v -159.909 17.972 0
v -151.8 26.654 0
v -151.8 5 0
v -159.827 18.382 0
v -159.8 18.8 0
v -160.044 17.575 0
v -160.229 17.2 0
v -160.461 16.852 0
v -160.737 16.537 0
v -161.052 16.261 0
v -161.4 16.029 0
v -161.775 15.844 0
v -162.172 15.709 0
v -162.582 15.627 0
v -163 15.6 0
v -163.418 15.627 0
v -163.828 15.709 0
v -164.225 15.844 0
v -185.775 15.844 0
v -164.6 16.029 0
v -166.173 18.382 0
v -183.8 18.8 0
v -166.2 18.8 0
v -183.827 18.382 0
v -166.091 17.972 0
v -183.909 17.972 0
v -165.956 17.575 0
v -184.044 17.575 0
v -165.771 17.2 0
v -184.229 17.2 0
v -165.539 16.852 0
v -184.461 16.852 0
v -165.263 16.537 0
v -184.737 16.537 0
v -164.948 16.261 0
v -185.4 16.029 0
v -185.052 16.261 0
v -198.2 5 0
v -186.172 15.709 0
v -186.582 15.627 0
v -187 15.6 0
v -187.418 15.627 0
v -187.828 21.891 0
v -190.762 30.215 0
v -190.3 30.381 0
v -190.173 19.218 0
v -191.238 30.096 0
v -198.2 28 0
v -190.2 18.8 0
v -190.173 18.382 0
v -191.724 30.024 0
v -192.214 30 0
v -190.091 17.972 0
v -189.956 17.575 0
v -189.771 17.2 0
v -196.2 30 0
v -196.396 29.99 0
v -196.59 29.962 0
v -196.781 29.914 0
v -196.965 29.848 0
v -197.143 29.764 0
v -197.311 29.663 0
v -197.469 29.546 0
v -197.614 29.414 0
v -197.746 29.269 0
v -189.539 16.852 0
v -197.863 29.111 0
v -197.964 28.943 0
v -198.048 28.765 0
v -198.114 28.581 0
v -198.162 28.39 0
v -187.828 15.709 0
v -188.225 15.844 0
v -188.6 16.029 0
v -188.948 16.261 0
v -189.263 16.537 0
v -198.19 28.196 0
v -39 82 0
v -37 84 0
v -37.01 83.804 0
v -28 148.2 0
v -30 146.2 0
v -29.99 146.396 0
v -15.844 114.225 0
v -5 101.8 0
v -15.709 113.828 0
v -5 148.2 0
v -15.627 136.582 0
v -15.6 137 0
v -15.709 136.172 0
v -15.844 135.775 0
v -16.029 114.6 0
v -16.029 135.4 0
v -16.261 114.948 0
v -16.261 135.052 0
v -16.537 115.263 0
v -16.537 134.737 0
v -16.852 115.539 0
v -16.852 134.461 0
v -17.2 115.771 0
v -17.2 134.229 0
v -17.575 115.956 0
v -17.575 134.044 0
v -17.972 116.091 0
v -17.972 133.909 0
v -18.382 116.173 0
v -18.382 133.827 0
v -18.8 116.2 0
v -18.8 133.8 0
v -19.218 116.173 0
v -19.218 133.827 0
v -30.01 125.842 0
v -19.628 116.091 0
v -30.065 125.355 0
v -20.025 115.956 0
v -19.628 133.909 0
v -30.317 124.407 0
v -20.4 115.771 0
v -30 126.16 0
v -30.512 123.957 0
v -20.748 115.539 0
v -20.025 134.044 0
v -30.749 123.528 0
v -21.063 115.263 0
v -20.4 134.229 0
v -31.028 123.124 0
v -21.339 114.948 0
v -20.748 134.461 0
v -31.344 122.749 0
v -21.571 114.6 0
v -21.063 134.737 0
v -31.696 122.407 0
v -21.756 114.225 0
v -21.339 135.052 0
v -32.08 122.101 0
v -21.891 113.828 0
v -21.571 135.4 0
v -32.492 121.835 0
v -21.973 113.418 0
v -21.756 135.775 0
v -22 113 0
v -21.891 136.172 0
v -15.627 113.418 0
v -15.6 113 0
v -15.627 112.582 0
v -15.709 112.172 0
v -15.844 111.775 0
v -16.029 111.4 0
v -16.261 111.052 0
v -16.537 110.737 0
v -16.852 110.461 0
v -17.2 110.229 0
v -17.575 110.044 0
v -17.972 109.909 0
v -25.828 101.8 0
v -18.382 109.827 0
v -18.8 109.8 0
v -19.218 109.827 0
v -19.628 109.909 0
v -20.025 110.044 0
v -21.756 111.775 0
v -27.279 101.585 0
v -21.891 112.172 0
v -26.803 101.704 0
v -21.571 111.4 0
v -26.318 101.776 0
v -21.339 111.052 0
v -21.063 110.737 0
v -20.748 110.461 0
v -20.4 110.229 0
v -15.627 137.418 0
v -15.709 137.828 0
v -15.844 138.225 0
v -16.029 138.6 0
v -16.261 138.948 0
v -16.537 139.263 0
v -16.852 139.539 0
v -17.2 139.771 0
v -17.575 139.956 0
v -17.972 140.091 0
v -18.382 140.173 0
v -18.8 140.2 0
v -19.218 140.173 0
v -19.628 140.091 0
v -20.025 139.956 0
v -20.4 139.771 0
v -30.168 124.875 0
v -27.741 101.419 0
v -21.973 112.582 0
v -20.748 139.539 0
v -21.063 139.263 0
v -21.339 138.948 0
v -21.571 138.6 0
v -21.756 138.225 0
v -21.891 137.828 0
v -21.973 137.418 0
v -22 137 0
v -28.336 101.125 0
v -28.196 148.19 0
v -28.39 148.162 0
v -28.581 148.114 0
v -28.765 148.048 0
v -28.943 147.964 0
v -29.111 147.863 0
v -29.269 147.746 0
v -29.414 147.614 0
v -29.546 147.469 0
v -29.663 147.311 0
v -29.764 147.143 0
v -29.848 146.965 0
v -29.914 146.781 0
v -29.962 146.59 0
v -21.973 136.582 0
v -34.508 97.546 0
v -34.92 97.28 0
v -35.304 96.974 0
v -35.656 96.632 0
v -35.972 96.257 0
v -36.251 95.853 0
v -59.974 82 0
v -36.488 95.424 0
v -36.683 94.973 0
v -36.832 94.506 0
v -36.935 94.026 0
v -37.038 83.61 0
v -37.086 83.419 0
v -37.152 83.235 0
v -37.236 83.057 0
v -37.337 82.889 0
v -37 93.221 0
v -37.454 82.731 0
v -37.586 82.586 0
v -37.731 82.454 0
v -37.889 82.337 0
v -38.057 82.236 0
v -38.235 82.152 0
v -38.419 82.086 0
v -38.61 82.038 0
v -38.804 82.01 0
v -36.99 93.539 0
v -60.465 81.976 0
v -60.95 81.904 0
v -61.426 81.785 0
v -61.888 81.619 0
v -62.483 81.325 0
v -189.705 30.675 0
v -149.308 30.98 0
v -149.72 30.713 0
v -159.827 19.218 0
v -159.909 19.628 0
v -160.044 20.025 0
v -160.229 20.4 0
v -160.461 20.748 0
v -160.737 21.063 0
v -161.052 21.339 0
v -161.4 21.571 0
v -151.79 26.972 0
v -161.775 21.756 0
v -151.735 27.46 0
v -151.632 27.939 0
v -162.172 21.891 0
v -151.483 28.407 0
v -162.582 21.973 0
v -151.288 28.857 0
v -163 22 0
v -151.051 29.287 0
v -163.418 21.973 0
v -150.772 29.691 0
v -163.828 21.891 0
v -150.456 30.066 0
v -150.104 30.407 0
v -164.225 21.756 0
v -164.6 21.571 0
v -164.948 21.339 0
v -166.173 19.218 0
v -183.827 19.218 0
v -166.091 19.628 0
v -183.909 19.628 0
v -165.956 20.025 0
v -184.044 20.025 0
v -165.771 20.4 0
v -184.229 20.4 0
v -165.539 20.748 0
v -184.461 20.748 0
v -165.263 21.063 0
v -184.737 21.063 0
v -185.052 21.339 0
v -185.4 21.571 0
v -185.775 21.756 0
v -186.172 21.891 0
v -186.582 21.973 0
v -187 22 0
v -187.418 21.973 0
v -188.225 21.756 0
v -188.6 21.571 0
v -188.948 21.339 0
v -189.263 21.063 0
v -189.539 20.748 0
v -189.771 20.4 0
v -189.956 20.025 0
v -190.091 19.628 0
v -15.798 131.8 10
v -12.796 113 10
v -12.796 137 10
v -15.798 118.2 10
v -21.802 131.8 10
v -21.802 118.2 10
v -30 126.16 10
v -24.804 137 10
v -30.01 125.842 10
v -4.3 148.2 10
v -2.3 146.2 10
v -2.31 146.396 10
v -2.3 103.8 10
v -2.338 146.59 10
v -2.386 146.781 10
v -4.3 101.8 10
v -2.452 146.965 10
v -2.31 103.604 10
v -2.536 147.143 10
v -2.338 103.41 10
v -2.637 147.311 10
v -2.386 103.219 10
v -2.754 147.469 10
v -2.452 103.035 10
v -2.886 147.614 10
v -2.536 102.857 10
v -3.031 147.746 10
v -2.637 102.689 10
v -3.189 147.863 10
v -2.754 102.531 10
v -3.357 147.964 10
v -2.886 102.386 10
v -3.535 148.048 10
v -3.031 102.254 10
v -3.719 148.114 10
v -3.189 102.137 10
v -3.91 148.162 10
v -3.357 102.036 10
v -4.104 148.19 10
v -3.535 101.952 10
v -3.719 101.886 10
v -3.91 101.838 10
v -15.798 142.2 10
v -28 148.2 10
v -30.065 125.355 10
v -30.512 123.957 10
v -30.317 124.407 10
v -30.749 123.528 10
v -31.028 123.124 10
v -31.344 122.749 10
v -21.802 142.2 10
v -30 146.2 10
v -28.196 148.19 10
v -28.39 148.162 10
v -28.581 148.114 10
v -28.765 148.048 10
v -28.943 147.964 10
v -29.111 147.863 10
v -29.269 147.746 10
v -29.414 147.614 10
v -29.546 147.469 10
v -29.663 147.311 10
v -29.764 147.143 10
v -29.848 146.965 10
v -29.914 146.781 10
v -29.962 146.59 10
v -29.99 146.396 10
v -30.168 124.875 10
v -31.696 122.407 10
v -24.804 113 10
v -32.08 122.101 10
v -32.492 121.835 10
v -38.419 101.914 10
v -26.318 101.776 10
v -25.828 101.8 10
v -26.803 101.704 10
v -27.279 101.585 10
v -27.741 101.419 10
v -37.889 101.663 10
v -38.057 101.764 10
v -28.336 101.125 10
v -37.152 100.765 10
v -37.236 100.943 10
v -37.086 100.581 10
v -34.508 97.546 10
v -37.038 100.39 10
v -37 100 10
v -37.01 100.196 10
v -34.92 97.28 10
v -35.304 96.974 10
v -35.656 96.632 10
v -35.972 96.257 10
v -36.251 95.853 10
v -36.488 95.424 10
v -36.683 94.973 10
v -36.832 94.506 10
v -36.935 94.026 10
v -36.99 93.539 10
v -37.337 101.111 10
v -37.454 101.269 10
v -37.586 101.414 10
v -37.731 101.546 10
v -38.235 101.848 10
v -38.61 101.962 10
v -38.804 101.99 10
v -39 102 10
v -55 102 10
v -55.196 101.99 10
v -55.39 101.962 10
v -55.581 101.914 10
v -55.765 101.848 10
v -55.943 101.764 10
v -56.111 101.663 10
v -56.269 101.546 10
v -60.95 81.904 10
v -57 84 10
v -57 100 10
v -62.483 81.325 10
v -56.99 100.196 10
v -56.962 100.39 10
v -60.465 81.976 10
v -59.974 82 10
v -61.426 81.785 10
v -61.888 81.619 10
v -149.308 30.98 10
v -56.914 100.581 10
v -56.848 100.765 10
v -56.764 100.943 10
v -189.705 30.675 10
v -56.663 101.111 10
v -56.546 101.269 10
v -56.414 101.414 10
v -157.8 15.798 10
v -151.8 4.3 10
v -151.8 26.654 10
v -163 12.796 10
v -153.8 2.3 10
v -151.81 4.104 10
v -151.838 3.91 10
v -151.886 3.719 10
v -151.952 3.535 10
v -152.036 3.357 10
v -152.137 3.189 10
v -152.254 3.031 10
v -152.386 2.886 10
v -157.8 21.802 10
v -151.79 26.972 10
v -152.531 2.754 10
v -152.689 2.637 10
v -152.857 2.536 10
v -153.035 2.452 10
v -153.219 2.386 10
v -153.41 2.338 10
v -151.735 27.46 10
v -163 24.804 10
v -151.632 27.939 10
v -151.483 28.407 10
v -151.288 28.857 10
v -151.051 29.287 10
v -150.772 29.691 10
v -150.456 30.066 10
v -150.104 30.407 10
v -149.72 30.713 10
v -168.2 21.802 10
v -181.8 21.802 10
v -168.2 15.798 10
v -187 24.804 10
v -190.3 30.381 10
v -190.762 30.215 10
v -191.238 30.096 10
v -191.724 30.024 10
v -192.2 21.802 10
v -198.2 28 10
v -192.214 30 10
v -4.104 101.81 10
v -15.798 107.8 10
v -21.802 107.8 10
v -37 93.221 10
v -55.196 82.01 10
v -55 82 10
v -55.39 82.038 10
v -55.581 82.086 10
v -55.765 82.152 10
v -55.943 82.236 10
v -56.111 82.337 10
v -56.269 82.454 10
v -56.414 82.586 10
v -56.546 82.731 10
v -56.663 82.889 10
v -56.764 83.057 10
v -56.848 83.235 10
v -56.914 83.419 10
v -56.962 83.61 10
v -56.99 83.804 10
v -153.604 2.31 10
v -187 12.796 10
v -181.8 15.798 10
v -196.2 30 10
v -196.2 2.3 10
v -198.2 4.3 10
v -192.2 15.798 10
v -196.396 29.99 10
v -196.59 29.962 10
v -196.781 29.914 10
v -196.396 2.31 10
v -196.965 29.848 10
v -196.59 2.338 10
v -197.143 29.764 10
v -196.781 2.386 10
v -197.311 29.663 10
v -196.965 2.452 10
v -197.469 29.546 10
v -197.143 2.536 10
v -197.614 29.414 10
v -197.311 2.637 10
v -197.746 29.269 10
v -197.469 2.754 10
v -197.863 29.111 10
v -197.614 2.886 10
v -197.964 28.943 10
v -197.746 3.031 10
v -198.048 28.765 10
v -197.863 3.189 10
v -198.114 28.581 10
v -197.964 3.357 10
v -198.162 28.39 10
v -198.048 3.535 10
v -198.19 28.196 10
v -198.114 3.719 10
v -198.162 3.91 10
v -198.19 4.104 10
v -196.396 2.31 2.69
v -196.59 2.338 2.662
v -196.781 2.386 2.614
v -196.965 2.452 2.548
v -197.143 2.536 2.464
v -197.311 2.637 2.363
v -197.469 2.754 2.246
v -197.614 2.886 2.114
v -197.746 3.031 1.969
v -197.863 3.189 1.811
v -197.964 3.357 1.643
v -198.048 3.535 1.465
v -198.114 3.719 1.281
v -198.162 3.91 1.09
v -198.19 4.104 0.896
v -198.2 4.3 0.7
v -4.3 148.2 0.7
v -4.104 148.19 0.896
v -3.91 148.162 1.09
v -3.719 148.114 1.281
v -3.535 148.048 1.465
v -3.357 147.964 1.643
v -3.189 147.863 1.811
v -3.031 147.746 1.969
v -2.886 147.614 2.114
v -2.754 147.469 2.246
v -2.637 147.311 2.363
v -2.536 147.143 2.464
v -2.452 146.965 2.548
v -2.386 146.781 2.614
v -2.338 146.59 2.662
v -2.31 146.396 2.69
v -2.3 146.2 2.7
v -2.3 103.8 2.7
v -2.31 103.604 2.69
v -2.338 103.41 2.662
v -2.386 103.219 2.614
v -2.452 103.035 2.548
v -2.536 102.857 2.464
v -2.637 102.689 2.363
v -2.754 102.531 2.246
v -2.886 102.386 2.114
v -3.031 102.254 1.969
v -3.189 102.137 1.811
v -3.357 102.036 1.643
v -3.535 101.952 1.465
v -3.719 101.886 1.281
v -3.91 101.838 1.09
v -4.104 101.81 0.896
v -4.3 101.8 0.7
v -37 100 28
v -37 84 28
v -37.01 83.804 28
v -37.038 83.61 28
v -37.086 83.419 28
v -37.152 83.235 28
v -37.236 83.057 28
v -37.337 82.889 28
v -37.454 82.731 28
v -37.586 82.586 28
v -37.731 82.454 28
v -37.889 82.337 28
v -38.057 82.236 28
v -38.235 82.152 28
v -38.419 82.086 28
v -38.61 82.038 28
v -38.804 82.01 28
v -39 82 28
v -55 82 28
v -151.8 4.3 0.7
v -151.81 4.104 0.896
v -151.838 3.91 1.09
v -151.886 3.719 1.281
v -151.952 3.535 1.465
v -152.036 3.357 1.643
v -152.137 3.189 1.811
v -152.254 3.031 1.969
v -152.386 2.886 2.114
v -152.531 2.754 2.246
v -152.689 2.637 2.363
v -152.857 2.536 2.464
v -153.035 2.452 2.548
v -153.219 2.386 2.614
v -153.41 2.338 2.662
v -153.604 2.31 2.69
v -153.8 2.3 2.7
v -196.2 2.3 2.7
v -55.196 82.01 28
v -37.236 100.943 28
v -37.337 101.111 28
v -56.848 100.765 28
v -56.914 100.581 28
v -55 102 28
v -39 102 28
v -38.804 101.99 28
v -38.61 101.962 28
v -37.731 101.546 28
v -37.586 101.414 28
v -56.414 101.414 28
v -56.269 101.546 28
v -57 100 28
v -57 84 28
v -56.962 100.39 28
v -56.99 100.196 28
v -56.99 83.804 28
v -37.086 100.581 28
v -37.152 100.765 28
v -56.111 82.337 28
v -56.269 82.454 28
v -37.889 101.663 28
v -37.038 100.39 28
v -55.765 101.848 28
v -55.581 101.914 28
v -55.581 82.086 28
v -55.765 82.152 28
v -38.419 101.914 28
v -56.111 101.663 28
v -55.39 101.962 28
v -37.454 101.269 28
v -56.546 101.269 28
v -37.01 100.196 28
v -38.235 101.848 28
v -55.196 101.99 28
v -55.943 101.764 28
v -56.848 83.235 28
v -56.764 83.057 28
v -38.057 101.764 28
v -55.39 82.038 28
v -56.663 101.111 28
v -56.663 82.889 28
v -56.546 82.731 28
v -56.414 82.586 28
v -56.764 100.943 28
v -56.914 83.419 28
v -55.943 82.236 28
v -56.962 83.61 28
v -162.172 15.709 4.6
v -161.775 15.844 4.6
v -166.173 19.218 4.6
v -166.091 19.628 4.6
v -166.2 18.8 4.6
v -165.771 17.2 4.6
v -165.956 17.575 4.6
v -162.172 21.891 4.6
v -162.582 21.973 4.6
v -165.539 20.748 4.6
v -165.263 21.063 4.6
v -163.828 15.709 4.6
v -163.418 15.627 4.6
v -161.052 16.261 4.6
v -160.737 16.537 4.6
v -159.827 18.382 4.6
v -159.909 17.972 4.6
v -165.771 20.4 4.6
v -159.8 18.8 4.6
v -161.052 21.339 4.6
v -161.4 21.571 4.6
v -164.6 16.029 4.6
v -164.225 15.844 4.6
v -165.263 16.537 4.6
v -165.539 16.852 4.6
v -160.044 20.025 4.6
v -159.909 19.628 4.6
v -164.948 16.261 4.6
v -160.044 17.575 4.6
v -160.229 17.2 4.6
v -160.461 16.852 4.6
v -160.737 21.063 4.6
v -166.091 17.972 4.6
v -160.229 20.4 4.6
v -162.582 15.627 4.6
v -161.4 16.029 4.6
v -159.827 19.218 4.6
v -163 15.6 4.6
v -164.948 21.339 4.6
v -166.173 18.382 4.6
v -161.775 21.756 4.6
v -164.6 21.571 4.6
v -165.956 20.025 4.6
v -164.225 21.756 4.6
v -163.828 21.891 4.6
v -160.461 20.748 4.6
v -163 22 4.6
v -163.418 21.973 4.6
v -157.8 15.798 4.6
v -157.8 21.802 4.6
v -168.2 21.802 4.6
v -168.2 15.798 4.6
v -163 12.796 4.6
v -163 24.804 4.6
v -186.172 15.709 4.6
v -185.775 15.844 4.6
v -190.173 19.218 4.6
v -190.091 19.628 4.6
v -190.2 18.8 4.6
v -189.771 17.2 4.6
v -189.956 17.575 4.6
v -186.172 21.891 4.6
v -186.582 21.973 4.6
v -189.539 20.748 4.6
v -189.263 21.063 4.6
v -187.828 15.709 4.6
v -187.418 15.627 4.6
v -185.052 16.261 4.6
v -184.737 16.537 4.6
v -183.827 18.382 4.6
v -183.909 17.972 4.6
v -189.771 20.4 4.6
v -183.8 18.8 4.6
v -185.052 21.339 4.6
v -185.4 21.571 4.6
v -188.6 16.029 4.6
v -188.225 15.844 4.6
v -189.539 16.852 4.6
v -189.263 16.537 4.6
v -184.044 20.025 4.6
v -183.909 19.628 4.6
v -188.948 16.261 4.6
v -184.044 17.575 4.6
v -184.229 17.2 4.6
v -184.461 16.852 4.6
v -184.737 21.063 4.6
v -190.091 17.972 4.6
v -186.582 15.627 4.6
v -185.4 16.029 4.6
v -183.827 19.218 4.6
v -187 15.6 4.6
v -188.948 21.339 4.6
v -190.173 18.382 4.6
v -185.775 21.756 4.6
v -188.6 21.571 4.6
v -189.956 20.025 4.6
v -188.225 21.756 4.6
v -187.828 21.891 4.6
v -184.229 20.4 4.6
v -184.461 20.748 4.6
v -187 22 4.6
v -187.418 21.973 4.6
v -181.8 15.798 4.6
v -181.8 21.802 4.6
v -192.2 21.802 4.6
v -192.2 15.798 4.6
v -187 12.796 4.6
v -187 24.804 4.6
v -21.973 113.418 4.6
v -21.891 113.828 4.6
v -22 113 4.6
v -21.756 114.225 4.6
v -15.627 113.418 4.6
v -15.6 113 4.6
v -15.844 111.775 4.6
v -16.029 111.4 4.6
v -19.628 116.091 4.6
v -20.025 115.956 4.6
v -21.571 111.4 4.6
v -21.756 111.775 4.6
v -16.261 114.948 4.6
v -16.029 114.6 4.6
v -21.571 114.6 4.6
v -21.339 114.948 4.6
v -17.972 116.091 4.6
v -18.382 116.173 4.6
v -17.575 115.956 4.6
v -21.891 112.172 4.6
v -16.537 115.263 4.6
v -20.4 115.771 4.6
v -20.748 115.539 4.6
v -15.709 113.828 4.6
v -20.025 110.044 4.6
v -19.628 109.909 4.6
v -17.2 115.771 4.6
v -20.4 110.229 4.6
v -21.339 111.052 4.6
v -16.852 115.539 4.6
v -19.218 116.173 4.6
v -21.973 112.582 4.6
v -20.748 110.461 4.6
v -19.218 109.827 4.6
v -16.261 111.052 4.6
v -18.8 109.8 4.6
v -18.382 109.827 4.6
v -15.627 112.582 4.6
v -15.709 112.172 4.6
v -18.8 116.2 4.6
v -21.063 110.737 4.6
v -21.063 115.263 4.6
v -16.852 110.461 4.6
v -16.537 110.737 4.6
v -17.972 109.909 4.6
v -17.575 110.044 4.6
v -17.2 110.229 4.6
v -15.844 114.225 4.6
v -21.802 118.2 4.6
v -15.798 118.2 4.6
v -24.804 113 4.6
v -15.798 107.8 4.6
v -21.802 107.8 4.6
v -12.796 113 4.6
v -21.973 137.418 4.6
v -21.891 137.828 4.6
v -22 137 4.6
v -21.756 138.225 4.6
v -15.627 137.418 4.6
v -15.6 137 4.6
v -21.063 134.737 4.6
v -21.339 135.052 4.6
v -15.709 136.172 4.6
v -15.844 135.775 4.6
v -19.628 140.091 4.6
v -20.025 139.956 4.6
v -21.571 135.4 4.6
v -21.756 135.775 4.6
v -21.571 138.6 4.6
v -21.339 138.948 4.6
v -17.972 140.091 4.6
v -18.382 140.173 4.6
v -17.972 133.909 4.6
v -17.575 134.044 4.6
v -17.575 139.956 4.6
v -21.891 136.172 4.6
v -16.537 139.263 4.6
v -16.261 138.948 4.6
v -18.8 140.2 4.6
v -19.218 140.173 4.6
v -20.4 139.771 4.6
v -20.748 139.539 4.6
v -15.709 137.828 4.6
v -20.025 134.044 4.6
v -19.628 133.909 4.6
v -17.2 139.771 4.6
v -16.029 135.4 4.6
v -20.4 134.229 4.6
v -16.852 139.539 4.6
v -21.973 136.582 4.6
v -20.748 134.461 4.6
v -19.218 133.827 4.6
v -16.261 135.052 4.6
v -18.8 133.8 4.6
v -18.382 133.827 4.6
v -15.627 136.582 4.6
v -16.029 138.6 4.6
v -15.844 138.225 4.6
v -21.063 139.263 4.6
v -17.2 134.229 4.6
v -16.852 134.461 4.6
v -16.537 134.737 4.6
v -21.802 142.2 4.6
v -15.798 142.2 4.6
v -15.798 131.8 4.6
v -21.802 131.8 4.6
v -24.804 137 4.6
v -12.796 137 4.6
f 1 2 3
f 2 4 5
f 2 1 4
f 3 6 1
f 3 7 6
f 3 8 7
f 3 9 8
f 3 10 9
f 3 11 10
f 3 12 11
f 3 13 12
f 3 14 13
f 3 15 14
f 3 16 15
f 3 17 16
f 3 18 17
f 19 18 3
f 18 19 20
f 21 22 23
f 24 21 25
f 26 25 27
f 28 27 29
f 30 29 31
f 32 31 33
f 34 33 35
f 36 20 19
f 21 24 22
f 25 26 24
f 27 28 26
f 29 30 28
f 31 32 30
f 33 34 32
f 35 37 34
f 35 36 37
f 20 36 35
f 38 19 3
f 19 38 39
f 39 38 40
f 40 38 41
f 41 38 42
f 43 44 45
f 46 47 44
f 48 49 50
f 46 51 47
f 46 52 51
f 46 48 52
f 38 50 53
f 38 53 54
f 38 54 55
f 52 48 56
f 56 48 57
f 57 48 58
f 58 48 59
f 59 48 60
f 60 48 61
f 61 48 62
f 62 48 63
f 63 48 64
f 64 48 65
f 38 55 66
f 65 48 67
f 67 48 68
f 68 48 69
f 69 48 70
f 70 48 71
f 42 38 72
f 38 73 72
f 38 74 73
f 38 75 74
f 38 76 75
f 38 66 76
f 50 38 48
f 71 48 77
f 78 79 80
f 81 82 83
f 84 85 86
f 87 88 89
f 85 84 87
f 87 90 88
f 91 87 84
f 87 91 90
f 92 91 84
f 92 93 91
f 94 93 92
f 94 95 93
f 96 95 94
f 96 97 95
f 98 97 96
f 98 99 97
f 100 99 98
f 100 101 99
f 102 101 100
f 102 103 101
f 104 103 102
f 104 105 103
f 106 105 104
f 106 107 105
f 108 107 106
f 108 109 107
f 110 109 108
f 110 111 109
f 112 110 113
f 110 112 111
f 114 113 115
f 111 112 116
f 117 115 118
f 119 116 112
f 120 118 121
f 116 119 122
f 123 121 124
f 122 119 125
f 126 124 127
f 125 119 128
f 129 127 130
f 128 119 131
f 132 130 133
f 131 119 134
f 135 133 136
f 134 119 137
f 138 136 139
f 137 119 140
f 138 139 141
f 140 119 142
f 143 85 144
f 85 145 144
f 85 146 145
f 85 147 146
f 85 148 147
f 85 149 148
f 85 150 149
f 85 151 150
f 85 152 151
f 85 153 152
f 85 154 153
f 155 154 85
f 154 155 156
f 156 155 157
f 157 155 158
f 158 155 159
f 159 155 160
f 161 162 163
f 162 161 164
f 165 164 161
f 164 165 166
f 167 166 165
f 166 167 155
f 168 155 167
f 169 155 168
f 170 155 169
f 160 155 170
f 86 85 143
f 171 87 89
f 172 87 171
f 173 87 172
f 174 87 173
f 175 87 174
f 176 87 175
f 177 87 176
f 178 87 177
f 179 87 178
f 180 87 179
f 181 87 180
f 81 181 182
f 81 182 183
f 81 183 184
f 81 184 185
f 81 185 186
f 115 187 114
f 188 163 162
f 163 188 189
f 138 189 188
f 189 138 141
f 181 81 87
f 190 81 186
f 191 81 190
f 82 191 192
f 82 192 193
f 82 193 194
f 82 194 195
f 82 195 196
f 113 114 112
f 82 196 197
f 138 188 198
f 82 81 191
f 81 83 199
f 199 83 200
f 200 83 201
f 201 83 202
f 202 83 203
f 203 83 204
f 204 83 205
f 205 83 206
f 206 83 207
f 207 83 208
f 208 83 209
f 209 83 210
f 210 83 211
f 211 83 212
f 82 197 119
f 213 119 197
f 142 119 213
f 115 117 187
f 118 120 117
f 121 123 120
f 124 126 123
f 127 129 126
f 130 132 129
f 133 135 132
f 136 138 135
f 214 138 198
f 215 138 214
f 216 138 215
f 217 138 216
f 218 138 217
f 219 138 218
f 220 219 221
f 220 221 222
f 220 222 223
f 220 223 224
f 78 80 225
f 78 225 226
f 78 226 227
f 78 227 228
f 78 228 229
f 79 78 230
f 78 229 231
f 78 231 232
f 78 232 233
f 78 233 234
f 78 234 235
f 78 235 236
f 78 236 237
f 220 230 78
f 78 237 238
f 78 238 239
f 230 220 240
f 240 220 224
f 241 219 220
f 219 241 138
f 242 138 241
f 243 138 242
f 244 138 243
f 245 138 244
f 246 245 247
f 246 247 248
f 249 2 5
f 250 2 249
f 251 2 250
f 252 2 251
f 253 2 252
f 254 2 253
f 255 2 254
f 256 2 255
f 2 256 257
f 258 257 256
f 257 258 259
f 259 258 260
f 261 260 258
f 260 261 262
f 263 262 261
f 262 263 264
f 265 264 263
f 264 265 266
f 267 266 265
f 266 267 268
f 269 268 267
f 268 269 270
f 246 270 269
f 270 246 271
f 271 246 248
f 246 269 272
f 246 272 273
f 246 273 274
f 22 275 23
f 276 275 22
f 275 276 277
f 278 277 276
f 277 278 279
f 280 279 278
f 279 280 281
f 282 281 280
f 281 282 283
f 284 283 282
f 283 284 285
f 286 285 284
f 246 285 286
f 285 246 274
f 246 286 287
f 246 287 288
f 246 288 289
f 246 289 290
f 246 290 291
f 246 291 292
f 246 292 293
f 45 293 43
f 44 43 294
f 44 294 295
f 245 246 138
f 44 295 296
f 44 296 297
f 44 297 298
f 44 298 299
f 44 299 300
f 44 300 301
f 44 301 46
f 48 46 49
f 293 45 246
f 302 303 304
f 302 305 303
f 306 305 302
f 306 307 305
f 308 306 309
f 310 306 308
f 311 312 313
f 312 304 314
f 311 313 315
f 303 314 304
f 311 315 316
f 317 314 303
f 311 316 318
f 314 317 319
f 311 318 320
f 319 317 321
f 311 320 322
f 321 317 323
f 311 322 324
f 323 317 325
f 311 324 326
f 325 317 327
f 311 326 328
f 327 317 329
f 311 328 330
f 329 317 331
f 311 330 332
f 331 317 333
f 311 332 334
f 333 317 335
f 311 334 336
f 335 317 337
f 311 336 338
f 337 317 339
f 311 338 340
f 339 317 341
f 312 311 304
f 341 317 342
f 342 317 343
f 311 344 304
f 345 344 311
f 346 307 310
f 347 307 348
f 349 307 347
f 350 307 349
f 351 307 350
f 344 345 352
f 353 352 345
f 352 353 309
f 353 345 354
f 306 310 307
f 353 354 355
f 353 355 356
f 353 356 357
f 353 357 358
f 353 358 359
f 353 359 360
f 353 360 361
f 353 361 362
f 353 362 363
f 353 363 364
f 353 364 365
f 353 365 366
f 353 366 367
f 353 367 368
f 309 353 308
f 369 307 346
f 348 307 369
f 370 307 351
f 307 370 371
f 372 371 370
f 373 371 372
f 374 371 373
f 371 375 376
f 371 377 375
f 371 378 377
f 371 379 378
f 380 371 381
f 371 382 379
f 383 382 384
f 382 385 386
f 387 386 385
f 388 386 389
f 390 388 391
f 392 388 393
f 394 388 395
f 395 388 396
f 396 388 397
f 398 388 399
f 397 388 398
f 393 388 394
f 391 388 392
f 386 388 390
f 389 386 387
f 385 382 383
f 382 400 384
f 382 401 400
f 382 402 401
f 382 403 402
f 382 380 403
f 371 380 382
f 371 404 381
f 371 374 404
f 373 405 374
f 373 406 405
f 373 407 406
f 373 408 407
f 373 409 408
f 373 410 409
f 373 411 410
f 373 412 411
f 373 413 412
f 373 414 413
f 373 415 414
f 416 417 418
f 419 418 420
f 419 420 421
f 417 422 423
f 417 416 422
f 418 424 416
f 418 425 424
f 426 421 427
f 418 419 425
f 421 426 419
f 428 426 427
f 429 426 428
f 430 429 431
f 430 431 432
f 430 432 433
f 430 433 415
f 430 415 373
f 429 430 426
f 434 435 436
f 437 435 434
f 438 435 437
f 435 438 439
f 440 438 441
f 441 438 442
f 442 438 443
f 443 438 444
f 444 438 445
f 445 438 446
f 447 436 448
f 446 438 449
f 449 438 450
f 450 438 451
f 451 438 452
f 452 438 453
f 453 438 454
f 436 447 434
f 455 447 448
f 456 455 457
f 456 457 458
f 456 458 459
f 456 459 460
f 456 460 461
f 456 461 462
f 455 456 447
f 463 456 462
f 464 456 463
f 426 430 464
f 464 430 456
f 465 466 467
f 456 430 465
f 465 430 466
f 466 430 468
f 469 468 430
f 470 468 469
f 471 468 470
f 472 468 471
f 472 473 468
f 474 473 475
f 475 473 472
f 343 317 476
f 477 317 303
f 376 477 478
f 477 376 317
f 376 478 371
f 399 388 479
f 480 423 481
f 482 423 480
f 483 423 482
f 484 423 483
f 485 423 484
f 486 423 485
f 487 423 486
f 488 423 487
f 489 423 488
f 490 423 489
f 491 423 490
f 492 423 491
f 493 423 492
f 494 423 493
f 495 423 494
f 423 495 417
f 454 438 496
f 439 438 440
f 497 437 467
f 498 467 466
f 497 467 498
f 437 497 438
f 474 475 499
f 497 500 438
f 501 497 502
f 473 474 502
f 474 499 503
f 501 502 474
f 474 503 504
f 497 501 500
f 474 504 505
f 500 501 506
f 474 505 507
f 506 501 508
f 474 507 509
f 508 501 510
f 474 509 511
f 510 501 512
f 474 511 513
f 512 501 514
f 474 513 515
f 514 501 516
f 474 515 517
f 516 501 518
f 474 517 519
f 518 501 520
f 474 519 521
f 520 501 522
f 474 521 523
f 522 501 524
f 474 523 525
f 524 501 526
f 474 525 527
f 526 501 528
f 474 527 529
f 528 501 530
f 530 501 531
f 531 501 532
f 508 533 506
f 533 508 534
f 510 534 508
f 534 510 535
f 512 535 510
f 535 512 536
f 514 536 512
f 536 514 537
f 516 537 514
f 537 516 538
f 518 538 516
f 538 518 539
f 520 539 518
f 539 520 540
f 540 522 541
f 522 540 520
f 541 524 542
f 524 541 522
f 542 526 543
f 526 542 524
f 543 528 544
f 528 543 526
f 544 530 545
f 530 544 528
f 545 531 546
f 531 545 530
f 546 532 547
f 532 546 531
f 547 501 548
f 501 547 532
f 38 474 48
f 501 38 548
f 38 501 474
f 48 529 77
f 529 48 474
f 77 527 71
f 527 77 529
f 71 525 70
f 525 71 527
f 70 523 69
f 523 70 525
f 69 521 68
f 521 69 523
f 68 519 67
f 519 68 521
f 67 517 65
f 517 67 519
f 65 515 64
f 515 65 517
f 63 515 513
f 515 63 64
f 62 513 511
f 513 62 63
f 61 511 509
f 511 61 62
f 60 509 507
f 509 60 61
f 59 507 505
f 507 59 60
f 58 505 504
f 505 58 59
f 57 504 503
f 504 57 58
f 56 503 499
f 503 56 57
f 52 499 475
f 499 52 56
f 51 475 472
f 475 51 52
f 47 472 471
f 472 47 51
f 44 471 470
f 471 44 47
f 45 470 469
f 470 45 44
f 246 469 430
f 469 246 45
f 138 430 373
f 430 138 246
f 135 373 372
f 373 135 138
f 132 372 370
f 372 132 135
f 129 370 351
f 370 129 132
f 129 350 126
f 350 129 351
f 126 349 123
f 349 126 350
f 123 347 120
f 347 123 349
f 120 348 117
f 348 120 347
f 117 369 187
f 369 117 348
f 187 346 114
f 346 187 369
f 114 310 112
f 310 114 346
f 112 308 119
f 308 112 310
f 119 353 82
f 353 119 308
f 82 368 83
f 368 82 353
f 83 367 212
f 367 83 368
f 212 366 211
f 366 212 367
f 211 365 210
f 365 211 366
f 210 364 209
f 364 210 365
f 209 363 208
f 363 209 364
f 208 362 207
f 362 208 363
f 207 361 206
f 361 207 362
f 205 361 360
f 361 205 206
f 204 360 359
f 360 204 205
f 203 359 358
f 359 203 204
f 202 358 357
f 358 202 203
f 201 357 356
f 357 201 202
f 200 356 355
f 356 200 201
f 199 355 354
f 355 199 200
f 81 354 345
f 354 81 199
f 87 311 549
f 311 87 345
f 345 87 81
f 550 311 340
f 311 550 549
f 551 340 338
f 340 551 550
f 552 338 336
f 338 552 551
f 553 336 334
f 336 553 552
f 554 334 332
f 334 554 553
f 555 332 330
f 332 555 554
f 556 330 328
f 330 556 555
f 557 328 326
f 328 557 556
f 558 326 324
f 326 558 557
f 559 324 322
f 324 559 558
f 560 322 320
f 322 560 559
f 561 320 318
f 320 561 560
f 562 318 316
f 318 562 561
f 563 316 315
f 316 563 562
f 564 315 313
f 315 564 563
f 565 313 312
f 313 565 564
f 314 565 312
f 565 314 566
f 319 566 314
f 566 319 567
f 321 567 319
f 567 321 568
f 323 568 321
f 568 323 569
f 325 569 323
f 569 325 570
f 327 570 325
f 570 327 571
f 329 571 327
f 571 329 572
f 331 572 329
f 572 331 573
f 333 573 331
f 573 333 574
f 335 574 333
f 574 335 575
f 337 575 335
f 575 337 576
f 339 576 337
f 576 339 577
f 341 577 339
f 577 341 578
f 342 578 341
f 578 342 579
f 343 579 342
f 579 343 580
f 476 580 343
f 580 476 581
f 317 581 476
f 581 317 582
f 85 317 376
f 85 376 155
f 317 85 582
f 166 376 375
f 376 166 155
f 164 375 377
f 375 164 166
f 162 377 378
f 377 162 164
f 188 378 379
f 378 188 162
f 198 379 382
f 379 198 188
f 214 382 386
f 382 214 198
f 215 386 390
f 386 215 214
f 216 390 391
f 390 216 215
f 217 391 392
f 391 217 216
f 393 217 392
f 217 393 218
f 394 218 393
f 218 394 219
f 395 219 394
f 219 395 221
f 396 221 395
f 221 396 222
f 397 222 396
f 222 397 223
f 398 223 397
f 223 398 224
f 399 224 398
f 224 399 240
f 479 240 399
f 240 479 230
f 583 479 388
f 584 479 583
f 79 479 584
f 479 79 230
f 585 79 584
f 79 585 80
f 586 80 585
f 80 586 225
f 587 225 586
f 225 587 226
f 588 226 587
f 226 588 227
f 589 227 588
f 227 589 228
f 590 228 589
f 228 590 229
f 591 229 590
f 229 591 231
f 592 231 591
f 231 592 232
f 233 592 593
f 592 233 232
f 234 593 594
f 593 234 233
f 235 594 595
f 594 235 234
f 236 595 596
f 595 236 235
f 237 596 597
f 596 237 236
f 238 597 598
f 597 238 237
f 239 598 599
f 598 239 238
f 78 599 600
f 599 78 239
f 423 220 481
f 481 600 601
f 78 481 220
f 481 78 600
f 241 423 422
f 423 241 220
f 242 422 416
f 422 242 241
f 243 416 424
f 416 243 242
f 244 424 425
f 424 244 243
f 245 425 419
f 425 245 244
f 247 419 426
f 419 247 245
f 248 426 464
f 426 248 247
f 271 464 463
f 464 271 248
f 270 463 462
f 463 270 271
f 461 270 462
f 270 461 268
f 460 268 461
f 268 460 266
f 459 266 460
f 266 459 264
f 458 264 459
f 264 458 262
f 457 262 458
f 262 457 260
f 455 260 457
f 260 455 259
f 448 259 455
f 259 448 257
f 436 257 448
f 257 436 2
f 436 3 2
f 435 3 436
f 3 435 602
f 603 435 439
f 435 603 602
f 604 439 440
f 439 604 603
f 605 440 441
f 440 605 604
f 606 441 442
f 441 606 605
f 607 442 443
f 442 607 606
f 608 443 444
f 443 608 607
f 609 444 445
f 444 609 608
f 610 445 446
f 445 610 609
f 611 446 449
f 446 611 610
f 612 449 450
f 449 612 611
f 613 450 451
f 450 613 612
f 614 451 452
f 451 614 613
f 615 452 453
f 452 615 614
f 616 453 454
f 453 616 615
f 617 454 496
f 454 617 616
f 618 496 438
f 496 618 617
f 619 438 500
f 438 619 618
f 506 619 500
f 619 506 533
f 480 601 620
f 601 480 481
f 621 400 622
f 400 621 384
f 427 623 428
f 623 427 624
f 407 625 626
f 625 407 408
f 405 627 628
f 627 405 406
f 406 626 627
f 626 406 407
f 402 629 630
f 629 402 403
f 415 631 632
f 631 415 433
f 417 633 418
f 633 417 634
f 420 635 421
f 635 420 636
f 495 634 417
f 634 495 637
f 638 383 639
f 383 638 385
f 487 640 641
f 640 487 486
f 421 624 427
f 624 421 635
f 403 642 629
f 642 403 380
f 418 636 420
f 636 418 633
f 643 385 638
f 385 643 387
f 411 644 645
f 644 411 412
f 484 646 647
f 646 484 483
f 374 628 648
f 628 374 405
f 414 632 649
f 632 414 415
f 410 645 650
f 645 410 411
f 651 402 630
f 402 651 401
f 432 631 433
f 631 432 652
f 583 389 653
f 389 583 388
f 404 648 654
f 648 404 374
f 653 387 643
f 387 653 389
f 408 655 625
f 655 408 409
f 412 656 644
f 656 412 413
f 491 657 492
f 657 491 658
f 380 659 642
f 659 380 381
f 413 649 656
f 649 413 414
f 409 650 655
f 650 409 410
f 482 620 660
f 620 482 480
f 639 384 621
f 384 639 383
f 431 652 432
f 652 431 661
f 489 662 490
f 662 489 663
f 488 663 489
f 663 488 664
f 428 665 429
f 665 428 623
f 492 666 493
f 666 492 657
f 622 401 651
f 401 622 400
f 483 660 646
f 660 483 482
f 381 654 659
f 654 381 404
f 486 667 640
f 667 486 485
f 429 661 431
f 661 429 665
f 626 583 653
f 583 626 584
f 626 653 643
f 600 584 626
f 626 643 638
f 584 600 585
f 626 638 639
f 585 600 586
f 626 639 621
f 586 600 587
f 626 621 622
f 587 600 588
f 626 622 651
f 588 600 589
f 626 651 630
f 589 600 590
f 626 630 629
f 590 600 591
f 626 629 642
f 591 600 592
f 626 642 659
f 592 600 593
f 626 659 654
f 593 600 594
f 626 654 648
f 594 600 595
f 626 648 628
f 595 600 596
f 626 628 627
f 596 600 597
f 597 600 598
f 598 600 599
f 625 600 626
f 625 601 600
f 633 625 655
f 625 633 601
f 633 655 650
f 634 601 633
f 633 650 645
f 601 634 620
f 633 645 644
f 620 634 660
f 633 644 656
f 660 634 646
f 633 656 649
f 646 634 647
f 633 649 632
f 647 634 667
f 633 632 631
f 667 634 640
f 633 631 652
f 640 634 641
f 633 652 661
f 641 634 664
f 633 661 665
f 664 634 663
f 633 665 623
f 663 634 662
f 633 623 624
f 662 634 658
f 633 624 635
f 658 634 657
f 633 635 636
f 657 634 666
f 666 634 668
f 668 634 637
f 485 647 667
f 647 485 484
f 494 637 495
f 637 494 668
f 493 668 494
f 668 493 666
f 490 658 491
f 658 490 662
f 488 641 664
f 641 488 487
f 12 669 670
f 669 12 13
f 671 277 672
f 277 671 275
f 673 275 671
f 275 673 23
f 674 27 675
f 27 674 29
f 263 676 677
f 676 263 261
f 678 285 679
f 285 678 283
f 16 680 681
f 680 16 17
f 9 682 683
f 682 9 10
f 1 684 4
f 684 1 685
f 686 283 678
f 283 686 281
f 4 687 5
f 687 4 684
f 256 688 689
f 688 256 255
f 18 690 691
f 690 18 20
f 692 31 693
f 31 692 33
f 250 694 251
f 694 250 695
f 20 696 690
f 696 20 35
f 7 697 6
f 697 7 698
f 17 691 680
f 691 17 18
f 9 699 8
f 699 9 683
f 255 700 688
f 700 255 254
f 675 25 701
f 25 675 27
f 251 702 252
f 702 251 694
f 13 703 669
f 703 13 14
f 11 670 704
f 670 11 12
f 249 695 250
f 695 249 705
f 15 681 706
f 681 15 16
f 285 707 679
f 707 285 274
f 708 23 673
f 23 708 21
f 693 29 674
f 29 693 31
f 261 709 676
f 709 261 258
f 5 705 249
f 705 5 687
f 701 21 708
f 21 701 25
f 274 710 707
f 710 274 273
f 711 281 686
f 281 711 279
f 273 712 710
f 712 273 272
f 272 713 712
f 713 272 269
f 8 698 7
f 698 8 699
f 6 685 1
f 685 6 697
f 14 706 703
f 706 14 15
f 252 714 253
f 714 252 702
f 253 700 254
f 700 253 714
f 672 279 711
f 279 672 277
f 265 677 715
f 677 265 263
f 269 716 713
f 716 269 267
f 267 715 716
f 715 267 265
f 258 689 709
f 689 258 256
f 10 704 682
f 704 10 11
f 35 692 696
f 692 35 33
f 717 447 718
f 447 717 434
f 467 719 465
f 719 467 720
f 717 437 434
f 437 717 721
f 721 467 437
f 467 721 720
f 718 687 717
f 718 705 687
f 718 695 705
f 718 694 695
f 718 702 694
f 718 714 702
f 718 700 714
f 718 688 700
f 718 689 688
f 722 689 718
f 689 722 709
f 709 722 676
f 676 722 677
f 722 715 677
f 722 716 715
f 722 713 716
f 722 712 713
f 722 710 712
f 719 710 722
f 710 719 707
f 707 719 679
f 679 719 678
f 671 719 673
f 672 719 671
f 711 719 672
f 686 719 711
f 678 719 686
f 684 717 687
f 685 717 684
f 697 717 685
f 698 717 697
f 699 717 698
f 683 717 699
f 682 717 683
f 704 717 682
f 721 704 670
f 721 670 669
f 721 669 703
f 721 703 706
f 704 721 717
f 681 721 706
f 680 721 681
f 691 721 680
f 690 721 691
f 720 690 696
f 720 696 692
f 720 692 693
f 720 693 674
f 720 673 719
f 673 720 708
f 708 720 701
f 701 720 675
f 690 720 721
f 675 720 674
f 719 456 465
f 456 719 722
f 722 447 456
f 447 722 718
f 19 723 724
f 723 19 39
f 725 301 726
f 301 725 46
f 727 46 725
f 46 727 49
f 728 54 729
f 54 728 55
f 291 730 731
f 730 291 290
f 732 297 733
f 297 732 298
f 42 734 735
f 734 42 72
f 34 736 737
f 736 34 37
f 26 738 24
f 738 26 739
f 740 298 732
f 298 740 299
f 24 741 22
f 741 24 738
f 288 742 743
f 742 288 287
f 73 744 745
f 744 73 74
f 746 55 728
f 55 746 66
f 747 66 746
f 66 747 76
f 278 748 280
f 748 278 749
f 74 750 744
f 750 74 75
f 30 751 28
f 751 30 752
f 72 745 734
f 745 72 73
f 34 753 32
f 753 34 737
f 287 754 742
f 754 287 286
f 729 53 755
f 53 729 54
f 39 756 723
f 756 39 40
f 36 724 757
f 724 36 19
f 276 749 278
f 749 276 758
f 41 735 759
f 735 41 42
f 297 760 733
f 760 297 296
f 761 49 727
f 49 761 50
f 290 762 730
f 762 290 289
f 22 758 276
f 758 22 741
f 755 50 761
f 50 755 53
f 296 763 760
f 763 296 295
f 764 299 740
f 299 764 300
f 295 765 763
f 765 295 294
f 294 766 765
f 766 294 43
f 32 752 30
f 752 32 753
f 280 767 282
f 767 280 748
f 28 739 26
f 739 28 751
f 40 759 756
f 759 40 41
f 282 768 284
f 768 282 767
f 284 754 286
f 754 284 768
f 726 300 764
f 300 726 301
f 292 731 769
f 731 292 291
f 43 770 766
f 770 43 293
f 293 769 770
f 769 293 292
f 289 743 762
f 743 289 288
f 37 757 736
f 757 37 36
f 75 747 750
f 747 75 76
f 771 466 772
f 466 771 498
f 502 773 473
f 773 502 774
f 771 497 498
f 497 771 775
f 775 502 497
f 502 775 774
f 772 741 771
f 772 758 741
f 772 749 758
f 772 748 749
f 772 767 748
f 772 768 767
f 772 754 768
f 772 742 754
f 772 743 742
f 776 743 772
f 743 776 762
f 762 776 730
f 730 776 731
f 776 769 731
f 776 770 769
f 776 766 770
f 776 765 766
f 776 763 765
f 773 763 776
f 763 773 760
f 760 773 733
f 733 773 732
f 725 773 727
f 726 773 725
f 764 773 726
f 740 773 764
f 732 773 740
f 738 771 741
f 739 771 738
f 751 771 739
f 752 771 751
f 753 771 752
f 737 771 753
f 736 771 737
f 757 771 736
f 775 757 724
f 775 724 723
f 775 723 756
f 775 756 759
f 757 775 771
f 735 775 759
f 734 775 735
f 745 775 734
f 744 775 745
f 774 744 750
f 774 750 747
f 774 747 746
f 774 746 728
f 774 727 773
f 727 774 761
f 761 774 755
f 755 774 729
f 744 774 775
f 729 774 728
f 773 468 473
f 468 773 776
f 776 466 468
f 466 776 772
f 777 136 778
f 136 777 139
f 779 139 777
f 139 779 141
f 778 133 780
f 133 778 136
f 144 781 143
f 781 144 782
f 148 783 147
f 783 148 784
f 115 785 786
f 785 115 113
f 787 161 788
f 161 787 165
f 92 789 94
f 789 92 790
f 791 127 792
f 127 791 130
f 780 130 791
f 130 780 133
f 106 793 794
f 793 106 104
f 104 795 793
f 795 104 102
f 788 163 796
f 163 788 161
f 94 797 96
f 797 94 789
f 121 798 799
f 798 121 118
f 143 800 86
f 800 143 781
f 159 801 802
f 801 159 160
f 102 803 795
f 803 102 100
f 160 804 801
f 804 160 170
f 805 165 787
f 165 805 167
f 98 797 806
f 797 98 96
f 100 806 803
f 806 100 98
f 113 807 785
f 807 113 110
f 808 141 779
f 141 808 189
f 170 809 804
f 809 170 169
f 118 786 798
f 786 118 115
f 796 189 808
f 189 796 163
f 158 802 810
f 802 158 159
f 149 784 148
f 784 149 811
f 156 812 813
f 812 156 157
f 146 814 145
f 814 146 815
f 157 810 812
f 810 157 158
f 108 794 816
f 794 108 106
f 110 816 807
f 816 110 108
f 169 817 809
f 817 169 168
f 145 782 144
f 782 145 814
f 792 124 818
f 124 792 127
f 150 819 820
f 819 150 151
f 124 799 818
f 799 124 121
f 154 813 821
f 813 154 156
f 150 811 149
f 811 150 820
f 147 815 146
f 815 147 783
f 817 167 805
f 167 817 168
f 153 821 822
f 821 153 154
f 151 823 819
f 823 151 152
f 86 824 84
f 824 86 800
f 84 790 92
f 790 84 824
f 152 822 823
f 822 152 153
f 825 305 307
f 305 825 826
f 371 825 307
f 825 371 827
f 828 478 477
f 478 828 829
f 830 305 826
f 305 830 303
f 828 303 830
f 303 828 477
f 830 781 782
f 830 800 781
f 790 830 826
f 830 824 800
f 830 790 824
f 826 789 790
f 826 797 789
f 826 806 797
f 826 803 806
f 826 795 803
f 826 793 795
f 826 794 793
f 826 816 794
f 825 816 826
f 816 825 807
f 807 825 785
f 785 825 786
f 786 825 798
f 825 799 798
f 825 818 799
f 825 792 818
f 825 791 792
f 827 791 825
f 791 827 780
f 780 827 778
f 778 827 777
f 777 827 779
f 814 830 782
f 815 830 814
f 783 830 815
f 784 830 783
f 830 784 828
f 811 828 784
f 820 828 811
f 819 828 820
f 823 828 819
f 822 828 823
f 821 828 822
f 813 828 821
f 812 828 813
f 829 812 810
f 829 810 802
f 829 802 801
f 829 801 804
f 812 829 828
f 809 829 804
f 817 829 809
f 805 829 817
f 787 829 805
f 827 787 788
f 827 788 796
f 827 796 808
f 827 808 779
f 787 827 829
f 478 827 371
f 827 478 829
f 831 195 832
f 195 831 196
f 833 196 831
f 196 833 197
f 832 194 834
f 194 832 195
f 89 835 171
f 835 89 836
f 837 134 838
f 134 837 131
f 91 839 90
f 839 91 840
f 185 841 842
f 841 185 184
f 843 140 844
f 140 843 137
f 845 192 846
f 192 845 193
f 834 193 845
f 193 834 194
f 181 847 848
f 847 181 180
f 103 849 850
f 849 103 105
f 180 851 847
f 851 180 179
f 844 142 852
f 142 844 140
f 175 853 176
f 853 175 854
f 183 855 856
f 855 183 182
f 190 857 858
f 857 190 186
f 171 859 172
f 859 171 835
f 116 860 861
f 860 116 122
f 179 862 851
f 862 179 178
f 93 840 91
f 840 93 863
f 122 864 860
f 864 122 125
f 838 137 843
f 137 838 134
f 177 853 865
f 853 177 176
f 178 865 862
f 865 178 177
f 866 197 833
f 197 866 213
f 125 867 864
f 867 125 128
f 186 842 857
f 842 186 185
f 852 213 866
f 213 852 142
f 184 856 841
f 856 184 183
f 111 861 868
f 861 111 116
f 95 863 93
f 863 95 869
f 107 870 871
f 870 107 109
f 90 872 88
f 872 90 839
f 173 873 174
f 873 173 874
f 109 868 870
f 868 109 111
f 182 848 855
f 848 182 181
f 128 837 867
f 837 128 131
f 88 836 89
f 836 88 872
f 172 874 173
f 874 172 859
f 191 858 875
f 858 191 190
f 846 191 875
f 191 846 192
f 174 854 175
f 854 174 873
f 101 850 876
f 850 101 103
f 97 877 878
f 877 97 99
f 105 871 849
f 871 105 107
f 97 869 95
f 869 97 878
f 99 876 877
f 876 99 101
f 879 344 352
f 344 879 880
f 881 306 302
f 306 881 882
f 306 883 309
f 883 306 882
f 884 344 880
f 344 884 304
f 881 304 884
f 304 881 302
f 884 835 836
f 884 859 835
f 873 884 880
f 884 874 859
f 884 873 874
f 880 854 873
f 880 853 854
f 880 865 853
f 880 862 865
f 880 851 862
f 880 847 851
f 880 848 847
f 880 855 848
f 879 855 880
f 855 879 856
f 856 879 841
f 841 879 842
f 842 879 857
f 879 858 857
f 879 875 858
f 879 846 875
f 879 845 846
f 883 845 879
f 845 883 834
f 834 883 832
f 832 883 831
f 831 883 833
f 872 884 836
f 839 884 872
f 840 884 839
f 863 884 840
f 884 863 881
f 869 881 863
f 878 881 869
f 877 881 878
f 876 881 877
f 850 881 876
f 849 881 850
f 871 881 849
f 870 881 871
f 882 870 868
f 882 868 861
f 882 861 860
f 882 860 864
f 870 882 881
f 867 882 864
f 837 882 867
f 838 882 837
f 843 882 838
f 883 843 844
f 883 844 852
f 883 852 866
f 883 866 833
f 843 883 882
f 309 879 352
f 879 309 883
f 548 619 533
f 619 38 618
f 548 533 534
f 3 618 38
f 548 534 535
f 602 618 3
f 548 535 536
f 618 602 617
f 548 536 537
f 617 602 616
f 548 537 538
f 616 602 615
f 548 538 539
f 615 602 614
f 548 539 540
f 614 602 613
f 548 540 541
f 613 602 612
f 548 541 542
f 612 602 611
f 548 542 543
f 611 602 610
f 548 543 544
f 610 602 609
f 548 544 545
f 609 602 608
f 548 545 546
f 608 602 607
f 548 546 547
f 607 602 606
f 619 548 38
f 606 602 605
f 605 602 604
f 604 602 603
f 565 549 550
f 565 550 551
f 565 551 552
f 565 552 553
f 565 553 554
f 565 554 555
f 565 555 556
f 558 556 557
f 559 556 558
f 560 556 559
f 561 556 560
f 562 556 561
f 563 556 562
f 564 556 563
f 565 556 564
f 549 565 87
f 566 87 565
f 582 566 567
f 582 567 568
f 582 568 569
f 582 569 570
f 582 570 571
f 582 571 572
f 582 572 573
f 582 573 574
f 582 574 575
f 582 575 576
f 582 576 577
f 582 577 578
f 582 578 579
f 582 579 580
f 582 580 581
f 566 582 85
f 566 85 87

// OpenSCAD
// file: ../../../modules/steel_rack.scad
use <bolts.scad>;

bolt_edge_offset = 15;
bolt_positions = [
  bolt_edge_offset,
  bolt_edge_offset + 98,
  bolt_edge_offset + 98 + 24,
];

module bolt_and_nut(y, h) {
  nut_thickness = 5;
  translate([0, y, h / 2])
    m6_bolt_hole(h + 1, center = true);
  translate([0, y, h - nut_thickness / 2])
    rotate([0, 0, 90])
    m6_nut_trap(nut_thickness, center = true);
}

module long_bar(w, y, h) {
  difference() {
    translate([w / 2, y / 2, h / 2])
      cube([w, y, h], center = true);

    for (x = bolt_positions) {
      translate([x, 0, 0])
        bolt_and_nut(y / 2, h);
    }
  }
}

module short_bar(w, y, h) {
  difference() {
    translate([w / 2, y / 2, h / 2])
      cube([w, y, h], center = true);

    translate([bolt_positions[0], 0, 0])
      bolt_and_nut(y / 2, h);
  }
}

module fillet_profile(r, h) {
  linear_extrude(height = h, center = true)
    difference() {
      square([r, r]);
      circle(r = r, $fn = 64);
    }
}
// file: ../../../modules/slide_rail_outer_bracket.scad
use <bolts.scad>
use <steel_rack.scad>

// スライドレール外側とL字アングルを接合するL字ブラケット。
// 設計の経緯と確定値は ledger/designs/steel-rack-500x400.md が正本。
//
// 座標系 (部品自身の datum):
//   X = 0 がこの部品側のL字アングル外側面。部品はアングル板厚の内側から始まる
//   Y = 0 がスライドレール外側面。+Y がラック外側
//   Z = 0 が部品底面 (レール下端と一致)
// front は screw_x = [37, 101.5]、rear は [79.5, 176] を自分の datum
// から渡す。 M6 が高さ 22.5±12 の対称配置のため部品は Z 反転対称になり、
// 左右のレールにも上下反転するだけで同じ2部品を使い回せる。

bracket_height = 45;
flange_t = 10; // 短辺 (X方向厚) の厚さ
// 長辺 (Y方向厚) の厚さ。旧断面は flange_t=10 を共用していたが、レール面を
// rail_offset 分外へ出すと M6 ナット挿入口が長辺と重なるため 2mm 削った
// (10→8、user決定)。ナット六角の内縁 (y=8.000) と長辺外面がツライチになる
arm_t = 8;
// レール接触面のラック外側オフセット。組付け実測でレール間隔が 385mm しか
// なくケース 412mm が入らないため、(412 - 385) / 2 + 0.5 = 14mm ずつ
// 各レールを外側へ移す (user指示)。M6 実穴は既に開いており位置を変えられない
rail_offset = 14;
inner_r = 4;
m6_z = [ 10.5, 34.5 ];
// クリアランス基準: 呼び寸法 + 0.4mm (実プリントの嵌合結果から拡大)
m6_pass_flat = 6.4; // M6ボルト通し六角の二面幅 (手前5mm)
m6_nut_flat = 10.4; // M6ナット窪み六角の二面幅 (奥5mm、ナット実測9.8 + 実効0.6)
m6_stage_depth = 5;
screw_z = 22.5;
m4_pass_flat = 4.4; // M4小トラスネジ通し六角の二面幅
m4_nut_flat = 7.4; // M4ナット窪み六角の二面幅 (ナット実測6.8 + 実効0.6)
m4_nut_depth = 2.8; // M4ナット窪みの深さ (user指定)
edge_margin = 8; // 穴の外縁から部品端までの余白 (自由な辺のみ)
angle_t = 2.2; // L字アングルの板厚

// 六角プリズム: 軸X・上下の辺が水平 (flat-up)。
// 天井を短い水平ブリッジにして垂れの改善を狙う
// (point-up だと天井面が水平から30°になり垂れた — 嵌合試験で確認済み)
module
hex_x_flat_up(flat_d, l)
{
    rotate([ 0, 90, 0 ]) rotate([ 0, 0, 90 ]) hex_hole(flat_d = flat_d, h = l);
}

// 六角プリズム: 軸Y・上下の辺が水平 (flat-up)。M6と同じくブリッジ天井
module
hex_y_flat_up(flat_d, l)
{
    rotate([ 90, 0, 0 ]) hex_hole(flat_d = flat_d, h = l);
}

module
slide_rail_outer_bracket(screw_x, name = "bracket")
{
    // flat-up配置では水平方向の穴半径は対角/2 (= 二面幅/(2*cos30))。
    // 8mm余白の契約はこの実半径に対して守る
    m6_nut_diag = m6_nut_flat / cos(30);
    m4_nut_diag = m4_nut_flat / cos(30);
    // M6中心: 実物のアングルには旧断面 (長辺厚10) の導出値
    // (厚10 + 内側R + 余白 + M6六角対角/2 = 28.0044) で既に穴が開いている。
    // 旧導出式から rail_offset を引くことで M6 実穴と部品外端の絶対位置を
    // 保ったまま、レール接触面 (y=0) だけをラック外側へ 14mm 出す
    m6_y = flange_t + inner_r + edge_margin + m6_nut_diag / 2 - rail_offset;
    short_len = m6_y + m6_nut_diag / 2 + edge_margin;
    // 長辺のX終端: 最奥のM4穴の最大断面 (ナット窪みの対角の半分) + 余白
    arm_end = max(screw_x) + m4_nut_diag / 2 + edge_margin;

    echo(str("CONTRACT ", name, ": height = ", bracket_height));
    echo(str("CONTRACT ", name, ": flange_t = ", flange_t));
    echo(str("CONTRACT ", name, ": arm_t = ", arm_t));
    echo(str("CONTRACT ", name, ": rail_offset = ", rail_offset));
    echo(str("CONTRACT ", name, ": inner_r = ", inner_r));
    echo(str("CONTRACT ", name, ": m6_z = ", m6_z));
    echo(str("CONTRACT ", name, ": m6_pass_flat = ", m6_pass_flat));
    echo(str("CONTRACT ", name, ": m6_nut_flat = ", m6_nut_flat));
    echo(str("CONTRACT ", name, ": screw_z = ", screw_z));
    echo(str("CONTRACT ", name, ": m4_pass_flat = ", m4_pass_flat));
    echo(str("CONTRACT ", name, ": m4_nut_flat = ", m4_nut_flat));
    echo(str("CONTRACT ", name, ": m4_nut_depth = ", m4_nut_depth));
    echo(str("CONTRACT ", name, ": edge_margin = ", edge_margin));
    echo(str("CONTRACT ", name, ": angle_t = ", angle_t));
    echo(str("CONTRACT ", name, ": screw_x = ", screw_x));
    echo(str("CONTRACT ",
             name,
             ": m6_y = ",
             m6_y,
             ", short_len = ",
             short_len,
             ", arm_end = ",
             arm_end));

    // 余白の契約 (自由な辺のみ。高さ45とM6のZはuser固定値なので対象外)。
    // M6ナット六角の内縁 (m6_y - 対角/2 = 8.000) は長辺外面 (y = arm_t) と
    // ツライチで、ナット挿入口が長辺に塞がれない (1e-9 は浮動小数の丸め猶予)
    assert(m6_y - m6_nut_diag / 2 >= arm_t - 1e-9,
           "M6 nut slot is blocked by the arm");
    assert(short_len - (m6_y + m6_nut_diag / 2) >= edge_margin,
           "M6 hole too close to the short-flange edge");
    assert(arm_end - (max(screw_x) + m4_nut_diag / 2) >= edge_margin,
           "M4 hole too close to the arm end");
    assert(min(screw_x) - m4_nut_diag / 2 >= angle_t + flange_t,
           "M4 hole overlaps the short flange");

    difference()
    {
        union()
        {
            // 短辺: アングル内側に当たる縦板 (M6で締結)
            translate([ angle_t, 0, 0 ])
                cube([ flange_t, short_len, bracket_height ]);

            // 長辺: レール外側面に当たる横板 (M4小トラスネジ+ナットで締結)
            translate([ angle_t, 0, 0 ])
                cube([ arm_end - angle_t, arm_t, bracket_height ]);

            // 内側コーナーのR4フィレット (応力集中の回避)
            translate([
                angle_t + flange_t + inner_r,
                arm_t + inner_r,
                bracket_height / 2
            ]) rotate([ 0, 0, 180 ]) fillet_profile(inner_r, bracket_height);
        }

        // M6の2段六角穴 (軸X・flat-up): 手前5mmが通し、奥5mmがナット窪み。
        // ナット窪みは +X へ延長した挿入回廊 (x=7.2..17): 短辺の背面から
        // fillet の掛かる区間を局所カットし、fillet 外端 (x=16.2) を 0.8mm
        // 超えて開放することで M6 ナットを +X 側から真っ直ぐ挿入できる
        // (fillet と挿入経路の干渉分を削るのは user 許容)。
        // 六角の下頂点 (y=8.000) は長辺外面とツライチで、正確な接触は
        // 退化した稜 (非多様体STL) を作るため、hull で 0.2mm 下へ掃引して
        // 長辺外面に浅い逃げ溝を彫る (ナットの嵌合には影響しない)
        slot_start = angle_t + flange_t - m6_stage_depth;
        slot_end = angle_t + flange_t + inner_r + 0.8;
        slot_relief = 0.2;
        for (z = m6_z) {
            translate([ angle_t + m6_stage_depth / 2 - 0.05, m6_y, z ])
                hex_x_flat_up(m6_pass_flat, m6_stage_depth + 0.1);
            translate([ (slot_start + slot_end) / 2, m6_y, z ]) hull()
            {
                hex_x_flat_up(m6_nut_flat, slot_end - slot_start);
                translate([ 0, -slot_relief, 0 ])
                    hex_x_flat_up(m6_nut_flat, slot_end - slot_start);
            }
        }

        // M4小トラスネジの穴 (軸Y・flat-up):
        // 通しは全厚を貫通し、L字の内側面 (y=8) から深さ2.8mmのナット窪み。
        // ネジはレール内側から刺さり
        // (トラス頭はスライダーと干渉しない実測済み)、
        // ナットが窪みの底で受けてレール板とブラケットを共締めする
        for (x = screw_x) {
            translate([ x, arm_t / 2, screw_z ])
                hex_y_flat_up(m4_pass_flat, arm_t + 0.2);
            translate([ x, arm_t - m4_nut_depth / 2 + 0.05, screw_z ])
                hex_y_flat_up(m4_nut_flat, m4_nut_depth + 0.1);
        }
    }
}
// file: ../../../modules/bolts.scad
module nut_trap(d, h, center = true) {
  linear_extrude(height = h, center = center)
  circle(d = d / cos(30), $fn = 6);
}

module bolt_hole(d, h, center = true) {
  linear_extrude(height = h, center = center)
  circle(d = d, $fn = 64);
}

// Hex holes for self-tapping (nominal - 0.2mm)
module hex_hole(flat_d, h) {
  linear_extrude(height = h, center = true)
  circle(d = flat_d / cos(30), $fn = 6);
}

module m3_bolt_hexhole(h) {
  rotate([0, 0, 90]) hex_hole(flat_d = 2.8, h = h);
}

module m4_bolt_hexhole(h) {
  rotate([0, 0, 90]) hex_hole(flat_d = 3.8, h = h);
}

module m6_bolt_hexhole(h) {
  rotate([0, 0, 90]) hex_hole(flat_d = 5.8, h = h);
}

module m8_bolt_hexhole(h) {
  rotate([0, 0, 90]) hex_hole(flat_d = 7.8, h = h);
}

// M3
module m3_bolt_hole(h, center = false) { bolt_hole(d = 3.4, h = h, center = center); }
module m3_nut_trap(h, center = false) { nut_trap(d = 5.7, h = h, center = center); }

// M4
module m4_bolt_hole(h, center = false) { bolt_hole(d = 4.4, h = h, center = center); }
module m4_nut_trap(h, center = false) { nut_trap(d = 7.5, h = h, center = center); }

// M6
module m6_bolt_hole(h, center = false) { bolt_hole(d = 6.2, h = h, center = center); }
module m6_nut_trap(h, center = false) { nut_trap(d = 10.2, h = h, center = center); }

// M8
module m8_bolt_hole(h, center = false) { bolt_hole(d = 8.4, h = h, center = center); }
module m8_nut_trap(h, center = false) { nut_trap(d = 13.3, h = h, center = center); }
// main file
use <../../../modules/shelf_frame.scad>

// ケース棚の筋交い。手前右・奥左用（左用の鏡像）。
shelf_frame_flat_print(mirrored = true) shelf_frame_brace();
